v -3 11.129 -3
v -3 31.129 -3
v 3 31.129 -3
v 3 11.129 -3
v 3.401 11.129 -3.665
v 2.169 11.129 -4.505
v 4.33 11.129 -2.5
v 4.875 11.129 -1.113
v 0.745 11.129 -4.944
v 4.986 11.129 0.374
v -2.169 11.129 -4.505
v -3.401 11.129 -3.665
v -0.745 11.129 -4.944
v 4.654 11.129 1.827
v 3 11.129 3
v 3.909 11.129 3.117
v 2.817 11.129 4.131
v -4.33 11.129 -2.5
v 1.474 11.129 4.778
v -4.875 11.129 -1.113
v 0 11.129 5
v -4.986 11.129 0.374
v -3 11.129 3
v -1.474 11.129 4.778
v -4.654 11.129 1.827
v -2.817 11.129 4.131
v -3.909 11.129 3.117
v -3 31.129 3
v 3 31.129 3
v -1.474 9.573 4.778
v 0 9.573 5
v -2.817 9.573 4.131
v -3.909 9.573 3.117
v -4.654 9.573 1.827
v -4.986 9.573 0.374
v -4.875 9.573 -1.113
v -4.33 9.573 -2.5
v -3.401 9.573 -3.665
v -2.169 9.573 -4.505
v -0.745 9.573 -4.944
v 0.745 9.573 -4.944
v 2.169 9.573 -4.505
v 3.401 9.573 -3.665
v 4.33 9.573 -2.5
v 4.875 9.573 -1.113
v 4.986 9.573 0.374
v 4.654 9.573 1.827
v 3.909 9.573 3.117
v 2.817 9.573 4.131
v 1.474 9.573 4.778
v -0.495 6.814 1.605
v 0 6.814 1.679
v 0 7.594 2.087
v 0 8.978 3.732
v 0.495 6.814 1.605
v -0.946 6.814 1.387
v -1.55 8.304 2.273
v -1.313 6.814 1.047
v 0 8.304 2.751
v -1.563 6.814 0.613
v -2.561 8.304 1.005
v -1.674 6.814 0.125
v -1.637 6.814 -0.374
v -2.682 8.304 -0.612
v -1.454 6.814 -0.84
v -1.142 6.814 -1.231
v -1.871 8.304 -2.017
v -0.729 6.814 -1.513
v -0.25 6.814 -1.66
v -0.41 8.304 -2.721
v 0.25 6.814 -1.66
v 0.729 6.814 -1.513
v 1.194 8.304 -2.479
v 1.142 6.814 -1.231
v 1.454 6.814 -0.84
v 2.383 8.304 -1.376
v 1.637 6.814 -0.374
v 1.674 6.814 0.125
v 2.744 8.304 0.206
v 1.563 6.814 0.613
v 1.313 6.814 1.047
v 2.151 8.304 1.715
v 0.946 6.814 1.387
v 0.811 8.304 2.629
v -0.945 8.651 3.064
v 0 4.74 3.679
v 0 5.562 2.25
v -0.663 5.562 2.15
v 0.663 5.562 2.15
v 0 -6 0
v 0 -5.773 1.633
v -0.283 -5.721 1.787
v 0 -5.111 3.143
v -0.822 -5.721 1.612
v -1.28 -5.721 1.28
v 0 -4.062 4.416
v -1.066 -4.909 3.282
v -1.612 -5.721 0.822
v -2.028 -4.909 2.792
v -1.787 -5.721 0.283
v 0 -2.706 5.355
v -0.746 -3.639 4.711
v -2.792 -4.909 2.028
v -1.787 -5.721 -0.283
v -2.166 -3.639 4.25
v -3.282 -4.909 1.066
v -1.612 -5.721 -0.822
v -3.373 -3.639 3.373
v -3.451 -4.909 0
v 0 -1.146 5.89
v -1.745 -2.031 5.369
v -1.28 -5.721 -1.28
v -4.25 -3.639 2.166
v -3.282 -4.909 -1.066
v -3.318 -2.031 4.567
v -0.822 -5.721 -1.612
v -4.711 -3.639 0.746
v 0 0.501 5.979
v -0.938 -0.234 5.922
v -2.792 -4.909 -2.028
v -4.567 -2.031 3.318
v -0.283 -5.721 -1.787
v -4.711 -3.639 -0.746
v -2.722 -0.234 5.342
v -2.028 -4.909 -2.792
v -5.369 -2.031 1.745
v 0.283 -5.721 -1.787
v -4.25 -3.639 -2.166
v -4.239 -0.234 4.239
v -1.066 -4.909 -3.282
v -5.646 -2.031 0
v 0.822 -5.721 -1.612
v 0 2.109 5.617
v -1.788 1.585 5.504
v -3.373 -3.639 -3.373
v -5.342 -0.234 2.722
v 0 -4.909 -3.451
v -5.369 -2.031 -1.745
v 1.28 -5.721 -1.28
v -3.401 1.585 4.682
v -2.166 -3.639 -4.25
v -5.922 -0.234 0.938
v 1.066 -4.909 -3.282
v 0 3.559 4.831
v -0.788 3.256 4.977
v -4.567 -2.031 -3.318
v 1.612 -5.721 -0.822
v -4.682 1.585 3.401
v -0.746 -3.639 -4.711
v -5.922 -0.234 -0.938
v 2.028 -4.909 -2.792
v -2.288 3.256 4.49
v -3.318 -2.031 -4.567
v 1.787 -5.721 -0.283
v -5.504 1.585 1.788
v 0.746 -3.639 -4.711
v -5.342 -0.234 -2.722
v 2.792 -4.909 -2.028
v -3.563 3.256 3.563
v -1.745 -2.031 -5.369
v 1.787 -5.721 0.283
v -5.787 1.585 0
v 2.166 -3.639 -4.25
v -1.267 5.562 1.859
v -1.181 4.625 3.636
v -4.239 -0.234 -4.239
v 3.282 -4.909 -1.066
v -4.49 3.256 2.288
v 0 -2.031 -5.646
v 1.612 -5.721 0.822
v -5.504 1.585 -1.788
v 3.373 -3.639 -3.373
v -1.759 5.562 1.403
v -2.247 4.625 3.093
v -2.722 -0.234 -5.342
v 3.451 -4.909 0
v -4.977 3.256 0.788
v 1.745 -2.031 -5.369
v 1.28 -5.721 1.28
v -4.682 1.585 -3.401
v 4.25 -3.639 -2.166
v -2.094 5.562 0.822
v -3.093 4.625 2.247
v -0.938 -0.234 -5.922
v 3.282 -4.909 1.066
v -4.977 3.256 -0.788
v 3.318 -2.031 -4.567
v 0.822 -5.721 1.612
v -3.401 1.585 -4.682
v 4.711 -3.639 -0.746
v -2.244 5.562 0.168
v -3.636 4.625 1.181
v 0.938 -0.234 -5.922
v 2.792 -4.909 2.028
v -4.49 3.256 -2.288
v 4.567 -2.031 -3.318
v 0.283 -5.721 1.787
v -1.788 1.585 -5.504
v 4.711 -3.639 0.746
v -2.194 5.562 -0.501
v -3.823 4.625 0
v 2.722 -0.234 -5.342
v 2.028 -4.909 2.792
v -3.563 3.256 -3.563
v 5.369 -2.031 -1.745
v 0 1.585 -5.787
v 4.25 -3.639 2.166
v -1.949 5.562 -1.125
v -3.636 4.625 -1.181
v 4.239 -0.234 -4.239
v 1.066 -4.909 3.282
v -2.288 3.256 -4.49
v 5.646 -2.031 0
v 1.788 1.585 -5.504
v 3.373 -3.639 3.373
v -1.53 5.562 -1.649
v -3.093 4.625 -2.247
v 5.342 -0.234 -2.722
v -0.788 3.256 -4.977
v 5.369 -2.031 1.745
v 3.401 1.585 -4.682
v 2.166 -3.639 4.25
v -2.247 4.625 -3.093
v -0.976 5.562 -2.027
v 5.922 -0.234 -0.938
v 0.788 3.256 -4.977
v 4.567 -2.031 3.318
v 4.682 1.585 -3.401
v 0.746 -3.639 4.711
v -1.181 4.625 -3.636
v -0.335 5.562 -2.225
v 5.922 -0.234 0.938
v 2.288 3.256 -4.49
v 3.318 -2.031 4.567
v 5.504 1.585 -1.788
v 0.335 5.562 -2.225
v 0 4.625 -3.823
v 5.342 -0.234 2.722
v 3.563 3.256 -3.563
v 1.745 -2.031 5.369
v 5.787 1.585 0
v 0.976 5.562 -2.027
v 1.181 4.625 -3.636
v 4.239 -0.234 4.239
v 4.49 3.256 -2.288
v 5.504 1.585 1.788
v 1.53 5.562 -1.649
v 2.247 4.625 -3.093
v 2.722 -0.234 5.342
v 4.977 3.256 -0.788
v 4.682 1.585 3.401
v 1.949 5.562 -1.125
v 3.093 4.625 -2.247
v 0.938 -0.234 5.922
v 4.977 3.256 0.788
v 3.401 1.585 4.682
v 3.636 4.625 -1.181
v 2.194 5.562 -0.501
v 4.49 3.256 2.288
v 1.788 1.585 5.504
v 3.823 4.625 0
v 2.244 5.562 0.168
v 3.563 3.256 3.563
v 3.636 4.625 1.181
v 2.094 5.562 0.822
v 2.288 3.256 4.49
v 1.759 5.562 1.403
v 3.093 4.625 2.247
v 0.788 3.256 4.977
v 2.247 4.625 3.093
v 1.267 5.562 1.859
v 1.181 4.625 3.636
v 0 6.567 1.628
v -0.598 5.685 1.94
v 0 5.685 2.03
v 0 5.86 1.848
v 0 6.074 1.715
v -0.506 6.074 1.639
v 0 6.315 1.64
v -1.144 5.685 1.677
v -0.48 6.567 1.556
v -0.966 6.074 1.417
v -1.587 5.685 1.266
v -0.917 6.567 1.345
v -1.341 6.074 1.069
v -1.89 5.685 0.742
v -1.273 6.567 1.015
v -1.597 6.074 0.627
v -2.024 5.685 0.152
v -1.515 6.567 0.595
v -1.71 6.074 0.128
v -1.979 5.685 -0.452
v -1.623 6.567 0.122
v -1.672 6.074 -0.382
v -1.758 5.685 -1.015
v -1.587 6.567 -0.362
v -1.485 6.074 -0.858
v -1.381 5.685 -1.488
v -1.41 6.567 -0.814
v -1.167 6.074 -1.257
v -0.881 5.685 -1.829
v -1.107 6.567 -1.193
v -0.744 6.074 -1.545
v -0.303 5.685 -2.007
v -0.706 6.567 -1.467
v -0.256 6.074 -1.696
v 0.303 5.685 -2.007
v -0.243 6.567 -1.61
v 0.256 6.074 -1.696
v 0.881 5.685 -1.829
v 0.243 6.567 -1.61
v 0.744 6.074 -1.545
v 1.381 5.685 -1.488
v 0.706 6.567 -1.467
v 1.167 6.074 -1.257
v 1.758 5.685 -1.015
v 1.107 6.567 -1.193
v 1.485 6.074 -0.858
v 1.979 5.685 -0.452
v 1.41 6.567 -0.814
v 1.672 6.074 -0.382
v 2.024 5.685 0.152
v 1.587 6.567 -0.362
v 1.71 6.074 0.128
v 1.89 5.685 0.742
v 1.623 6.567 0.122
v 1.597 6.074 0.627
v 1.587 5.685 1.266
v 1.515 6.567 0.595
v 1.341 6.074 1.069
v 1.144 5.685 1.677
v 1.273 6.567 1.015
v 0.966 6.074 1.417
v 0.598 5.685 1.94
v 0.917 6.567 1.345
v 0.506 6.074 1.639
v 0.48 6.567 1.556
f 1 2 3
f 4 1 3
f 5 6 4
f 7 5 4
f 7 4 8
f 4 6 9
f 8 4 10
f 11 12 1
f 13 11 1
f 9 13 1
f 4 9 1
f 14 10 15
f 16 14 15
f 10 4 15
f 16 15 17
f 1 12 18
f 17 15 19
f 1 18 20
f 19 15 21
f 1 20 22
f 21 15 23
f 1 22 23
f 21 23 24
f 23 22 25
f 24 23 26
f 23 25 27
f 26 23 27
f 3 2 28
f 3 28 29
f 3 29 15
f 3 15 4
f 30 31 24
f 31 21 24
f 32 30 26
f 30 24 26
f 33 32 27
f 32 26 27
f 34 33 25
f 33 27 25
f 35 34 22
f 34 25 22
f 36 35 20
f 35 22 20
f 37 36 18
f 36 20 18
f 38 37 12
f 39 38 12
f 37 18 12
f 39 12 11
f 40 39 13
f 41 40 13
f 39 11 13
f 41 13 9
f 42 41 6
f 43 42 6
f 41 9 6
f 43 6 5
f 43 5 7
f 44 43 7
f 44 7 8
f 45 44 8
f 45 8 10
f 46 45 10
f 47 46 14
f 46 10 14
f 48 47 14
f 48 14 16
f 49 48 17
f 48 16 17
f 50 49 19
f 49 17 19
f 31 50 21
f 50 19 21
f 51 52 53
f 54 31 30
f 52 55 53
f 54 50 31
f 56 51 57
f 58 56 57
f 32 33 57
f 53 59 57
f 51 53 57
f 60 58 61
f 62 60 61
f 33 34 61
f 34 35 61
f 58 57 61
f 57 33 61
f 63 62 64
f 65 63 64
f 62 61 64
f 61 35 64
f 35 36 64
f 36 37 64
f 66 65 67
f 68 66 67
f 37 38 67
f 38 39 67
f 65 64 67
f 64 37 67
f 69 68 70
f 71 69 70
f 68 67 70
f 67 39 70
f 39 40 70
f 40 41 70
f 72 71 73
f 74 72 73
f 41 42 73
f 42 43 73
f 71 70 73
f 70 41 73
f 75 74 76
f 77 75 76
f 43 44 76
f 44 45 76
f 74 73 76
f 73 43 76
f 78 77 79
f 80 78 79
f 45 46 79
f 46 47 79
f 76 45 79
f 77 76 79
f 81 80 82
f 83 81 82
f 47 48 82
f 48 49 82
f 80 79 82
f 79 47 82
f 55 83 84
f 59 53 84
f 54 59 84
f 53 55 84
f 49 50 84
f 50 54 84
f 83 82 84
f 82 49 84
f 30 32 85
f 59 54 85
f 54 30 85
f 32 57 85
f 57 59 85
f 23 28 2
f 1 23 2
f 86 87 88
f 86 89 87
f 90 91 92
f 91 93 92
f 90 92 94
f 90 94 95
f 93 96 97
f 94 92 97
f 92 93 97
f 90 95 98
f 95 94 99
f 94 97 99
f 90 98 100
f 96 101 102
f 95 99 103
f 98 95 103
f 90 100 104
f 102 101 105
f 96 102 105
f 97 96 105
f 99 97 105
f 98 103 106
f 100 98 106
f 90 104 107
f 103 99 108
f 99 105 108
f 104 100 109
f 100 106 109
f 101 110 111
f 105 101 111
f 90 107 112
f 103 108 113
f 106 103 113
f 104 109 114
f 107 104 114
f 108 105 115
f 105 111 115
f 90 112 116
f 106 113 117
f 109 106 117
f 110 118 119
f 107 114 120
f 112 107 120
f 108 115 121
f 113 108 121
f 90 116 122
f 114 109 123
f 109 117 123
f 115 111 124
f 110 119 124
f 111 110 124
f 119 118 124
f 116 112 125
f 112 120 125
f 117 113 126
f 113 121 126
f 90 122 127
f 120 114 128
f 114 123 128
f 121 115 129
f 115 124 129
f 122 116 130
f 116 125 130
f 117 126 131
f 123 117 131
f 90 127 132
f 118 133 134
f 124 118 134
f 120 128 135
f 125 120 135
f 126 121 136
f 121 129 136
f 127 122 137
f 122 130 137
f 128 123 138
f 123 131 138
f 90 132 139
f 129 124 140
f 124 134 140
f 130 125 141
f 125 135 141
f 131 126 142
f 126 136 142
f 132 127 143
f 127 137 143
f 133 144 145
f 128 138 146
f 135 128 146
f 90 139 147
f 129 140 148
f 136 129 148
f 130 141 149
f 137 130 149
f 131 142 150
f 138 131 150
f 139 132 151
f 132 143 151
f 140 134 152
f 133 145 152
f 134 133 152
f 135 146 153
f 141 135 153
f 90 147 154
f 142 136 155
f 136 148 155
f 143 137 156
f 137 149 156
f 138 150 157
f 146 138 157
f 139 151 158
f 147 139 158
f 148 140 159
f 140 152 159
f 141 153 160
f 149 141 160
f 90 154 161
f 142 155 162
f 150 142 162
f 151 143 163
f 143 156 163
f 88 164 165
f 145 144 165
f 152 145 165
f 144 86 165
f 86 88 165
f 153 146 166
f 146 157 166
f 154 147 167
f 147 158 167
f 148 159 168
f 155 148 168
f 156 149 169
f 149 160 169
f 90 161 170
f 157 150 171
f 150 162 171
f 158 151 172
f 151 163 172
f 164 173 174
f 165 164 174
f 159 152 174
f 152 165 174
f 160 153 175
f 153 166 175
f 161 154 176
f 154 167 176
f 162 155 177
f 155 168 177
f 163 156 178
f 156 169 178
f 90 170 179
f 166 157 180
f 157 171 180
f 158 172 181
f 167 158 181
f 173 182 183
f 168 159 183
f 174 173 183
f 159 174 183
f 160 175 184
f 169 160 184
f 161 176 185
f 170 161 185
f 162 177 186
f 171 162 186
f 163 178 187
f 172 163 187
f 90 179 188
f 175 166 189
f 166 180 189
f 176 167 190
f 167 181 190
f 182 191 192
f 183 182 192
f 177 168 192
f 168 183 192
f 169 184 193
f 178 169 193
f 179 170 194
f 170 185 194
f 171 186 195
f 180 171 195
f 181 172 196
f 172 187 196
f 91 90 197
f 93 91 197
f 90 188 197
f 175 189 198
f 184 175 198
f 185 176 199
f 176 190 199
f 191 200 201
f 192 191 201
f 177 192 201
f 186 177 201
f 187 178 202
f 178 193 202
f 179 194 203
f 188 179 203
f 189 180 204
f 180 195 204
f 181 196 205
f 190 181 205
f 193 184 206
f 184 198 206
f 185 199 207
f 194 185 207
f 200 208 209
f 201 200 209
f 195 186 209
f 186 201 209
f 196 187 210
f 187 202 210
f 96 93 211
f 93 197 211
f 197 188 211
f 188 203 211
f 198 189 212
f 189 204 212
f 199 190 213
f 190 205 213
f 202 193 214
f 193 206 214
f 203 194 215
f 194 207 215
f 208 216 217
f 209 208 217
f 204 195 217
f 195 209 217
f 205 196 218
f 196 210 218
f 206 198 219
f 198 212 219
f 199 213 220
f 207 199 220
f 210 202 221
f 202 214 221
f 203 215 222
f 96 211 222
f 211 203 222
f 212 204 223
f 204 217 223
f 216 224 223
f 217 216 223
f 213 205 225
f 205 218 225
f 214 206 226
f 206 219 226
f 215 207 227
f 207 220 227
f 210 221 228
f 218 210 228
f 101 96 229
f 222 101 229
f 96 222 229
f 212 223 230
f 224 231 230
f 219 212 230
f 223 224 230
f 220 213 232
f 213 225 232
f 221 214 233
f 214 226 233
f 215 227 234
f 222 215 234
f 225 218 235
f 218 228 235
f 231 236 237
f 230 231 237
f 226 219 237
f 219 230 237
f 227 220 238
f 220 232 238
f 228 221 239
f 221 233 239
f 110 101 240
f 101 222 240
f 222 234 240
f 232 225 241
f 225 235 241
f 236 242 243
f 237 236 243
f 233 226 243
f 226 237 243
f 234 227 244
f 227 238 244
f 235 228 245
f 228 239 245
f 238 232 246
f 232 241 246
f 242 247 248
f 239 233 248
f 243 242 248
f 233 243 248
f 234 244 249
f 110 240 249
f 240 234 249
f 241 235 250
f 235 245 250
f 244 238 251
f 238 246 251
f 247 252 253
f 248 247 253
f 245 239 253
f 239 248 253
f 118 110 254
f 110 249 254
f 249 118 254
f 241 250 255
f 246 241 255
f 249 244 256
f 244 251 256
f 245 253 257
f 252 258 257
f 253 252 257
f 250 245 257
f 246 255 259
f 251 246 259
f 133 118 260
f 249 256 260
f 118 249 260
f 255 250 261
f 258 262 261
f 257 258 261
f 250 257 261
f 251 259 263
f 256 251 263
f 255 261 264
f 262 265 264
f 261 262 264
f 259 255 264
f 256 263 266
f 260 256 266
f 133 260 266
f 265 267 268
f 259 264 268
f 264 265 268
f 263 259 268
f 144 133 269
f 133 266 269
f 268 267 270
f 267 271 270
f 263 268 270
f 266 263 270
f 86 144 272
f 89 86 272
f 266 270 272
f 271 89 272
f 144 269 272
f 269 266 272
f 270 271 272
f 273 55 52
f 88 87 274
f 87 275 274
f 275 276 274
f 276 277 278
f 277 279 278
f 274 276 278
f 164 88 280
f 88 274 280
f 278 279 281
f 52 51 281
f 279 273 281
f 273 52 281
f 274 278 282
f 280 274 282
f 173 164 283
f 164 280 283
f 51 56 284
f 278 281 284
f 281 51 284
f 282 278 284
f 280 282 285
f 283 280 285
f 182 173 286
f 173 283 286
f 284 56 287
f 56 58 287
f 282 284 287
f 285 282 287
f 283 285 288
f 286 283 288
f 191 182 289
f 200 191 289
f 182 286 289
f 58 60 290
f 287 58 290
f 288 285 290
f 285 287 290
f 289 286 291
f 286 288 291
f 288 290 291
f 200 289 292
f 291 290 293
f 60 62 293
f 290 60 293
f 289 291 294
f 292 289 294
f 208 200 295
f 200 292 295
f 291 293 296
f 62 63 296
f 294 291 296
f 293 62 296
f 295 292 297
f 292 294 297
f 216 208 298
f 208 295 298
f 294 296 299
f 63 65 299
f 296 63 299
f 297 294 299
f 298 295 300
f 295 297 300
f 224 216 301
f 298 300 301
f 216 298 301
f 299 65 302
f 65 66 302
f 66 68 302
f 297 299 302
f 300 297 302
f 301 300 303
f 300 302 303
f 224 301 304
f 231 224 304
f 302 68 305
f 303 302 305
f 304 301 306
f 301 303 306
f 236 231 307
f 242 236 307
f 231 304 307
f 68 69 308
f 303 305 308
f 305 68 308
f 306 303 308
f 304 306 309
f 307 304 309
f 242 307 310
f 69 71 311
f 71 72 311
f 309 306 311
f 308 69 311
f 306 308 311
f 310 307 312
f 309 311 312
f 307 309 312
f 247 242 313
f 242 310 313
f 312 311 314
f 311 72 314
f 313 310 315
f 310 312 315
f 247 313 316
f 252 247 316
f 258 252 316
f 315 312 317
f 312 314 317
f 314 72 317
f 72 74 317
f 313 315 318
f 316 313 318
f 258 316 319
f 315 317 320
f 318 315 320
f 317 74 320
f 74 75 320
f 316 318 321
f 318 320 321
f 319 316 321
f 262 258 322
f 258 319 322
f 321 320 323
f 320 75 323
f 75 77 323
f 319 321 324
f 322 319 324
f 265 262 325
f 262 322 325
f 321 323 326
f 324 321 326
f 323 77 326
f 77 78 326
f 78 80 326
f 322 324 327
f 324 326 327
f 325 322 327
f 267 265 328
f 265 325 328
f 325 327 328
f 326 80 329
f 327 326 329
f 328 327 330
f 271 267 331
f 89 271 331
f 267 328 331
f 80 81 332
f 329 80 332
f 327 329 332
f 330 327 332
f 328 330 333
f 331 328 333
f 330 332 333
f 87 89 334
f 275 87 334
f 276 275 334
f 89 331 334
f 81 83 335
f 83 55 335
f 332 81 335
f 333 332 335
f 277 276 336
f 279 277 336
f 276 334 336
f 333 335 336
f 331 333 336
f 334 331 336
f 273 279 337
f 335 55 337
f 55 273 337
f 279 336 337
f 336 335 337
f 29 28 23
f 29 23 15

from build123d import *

# Parameters (mm, degrees)
SKETCH_2_W      = 6
SKETCH_2_H      = 6
EXTRUDE_1_DEPTH = 20


with BuildPart() as part:
    # 草图1 → 旋转1 (revolve)
    with BuildSketch(Plane.XY, mode=Mode.PRIVATE) as revolve_1_sk:
        with BuildLine():
            Line((-5, 9.572809864), (-5, 11.128838899))
            Line((-5, 11.128838899), (-3.694047059, 11.128838899))
            Line((-3.694047059, 11.128838899), (0, 11.128838899))
            Line((0, 11.128838899), (0, -6))
            ThreePointArc((0, -6), (-5.889524943, -1.146078506), (-2.249952649, 5.56216802))
            ThreePointArc((-2.249952649, 5.56216802), (-1.71510176, 6.07424335), (-1.67910561, 6.813831678))
            add(Edge.make_bspline(
                [(-1.67910561, 6.813831678), (-2.255406993, 8.492909128), (-5, 9.572809864)],
                knots=[0, 0, 0, 1, 1, 1], degree=2))
        make_face()
    revolve(revolve_1_sk.sketch.rotate(Axis((0, 11.882352941, 0), (0, -1, 0)), 270), axis=Axis((0, 11.882352941, 0), (0, -1, 0)))

    # 草图2 → 凸台-拉伸1 (add)
    with BuildSketch(Plane(origin=(0, 11.128838899, 0), x_dir=(1, 0, 0), z_dir=(0, 1, 0))):
        Rectangle(SKETCH_2_W, SKETCH_2_H)
    extrude(amount=EXTRUDE_1_DEPTH)


solid = part.part
